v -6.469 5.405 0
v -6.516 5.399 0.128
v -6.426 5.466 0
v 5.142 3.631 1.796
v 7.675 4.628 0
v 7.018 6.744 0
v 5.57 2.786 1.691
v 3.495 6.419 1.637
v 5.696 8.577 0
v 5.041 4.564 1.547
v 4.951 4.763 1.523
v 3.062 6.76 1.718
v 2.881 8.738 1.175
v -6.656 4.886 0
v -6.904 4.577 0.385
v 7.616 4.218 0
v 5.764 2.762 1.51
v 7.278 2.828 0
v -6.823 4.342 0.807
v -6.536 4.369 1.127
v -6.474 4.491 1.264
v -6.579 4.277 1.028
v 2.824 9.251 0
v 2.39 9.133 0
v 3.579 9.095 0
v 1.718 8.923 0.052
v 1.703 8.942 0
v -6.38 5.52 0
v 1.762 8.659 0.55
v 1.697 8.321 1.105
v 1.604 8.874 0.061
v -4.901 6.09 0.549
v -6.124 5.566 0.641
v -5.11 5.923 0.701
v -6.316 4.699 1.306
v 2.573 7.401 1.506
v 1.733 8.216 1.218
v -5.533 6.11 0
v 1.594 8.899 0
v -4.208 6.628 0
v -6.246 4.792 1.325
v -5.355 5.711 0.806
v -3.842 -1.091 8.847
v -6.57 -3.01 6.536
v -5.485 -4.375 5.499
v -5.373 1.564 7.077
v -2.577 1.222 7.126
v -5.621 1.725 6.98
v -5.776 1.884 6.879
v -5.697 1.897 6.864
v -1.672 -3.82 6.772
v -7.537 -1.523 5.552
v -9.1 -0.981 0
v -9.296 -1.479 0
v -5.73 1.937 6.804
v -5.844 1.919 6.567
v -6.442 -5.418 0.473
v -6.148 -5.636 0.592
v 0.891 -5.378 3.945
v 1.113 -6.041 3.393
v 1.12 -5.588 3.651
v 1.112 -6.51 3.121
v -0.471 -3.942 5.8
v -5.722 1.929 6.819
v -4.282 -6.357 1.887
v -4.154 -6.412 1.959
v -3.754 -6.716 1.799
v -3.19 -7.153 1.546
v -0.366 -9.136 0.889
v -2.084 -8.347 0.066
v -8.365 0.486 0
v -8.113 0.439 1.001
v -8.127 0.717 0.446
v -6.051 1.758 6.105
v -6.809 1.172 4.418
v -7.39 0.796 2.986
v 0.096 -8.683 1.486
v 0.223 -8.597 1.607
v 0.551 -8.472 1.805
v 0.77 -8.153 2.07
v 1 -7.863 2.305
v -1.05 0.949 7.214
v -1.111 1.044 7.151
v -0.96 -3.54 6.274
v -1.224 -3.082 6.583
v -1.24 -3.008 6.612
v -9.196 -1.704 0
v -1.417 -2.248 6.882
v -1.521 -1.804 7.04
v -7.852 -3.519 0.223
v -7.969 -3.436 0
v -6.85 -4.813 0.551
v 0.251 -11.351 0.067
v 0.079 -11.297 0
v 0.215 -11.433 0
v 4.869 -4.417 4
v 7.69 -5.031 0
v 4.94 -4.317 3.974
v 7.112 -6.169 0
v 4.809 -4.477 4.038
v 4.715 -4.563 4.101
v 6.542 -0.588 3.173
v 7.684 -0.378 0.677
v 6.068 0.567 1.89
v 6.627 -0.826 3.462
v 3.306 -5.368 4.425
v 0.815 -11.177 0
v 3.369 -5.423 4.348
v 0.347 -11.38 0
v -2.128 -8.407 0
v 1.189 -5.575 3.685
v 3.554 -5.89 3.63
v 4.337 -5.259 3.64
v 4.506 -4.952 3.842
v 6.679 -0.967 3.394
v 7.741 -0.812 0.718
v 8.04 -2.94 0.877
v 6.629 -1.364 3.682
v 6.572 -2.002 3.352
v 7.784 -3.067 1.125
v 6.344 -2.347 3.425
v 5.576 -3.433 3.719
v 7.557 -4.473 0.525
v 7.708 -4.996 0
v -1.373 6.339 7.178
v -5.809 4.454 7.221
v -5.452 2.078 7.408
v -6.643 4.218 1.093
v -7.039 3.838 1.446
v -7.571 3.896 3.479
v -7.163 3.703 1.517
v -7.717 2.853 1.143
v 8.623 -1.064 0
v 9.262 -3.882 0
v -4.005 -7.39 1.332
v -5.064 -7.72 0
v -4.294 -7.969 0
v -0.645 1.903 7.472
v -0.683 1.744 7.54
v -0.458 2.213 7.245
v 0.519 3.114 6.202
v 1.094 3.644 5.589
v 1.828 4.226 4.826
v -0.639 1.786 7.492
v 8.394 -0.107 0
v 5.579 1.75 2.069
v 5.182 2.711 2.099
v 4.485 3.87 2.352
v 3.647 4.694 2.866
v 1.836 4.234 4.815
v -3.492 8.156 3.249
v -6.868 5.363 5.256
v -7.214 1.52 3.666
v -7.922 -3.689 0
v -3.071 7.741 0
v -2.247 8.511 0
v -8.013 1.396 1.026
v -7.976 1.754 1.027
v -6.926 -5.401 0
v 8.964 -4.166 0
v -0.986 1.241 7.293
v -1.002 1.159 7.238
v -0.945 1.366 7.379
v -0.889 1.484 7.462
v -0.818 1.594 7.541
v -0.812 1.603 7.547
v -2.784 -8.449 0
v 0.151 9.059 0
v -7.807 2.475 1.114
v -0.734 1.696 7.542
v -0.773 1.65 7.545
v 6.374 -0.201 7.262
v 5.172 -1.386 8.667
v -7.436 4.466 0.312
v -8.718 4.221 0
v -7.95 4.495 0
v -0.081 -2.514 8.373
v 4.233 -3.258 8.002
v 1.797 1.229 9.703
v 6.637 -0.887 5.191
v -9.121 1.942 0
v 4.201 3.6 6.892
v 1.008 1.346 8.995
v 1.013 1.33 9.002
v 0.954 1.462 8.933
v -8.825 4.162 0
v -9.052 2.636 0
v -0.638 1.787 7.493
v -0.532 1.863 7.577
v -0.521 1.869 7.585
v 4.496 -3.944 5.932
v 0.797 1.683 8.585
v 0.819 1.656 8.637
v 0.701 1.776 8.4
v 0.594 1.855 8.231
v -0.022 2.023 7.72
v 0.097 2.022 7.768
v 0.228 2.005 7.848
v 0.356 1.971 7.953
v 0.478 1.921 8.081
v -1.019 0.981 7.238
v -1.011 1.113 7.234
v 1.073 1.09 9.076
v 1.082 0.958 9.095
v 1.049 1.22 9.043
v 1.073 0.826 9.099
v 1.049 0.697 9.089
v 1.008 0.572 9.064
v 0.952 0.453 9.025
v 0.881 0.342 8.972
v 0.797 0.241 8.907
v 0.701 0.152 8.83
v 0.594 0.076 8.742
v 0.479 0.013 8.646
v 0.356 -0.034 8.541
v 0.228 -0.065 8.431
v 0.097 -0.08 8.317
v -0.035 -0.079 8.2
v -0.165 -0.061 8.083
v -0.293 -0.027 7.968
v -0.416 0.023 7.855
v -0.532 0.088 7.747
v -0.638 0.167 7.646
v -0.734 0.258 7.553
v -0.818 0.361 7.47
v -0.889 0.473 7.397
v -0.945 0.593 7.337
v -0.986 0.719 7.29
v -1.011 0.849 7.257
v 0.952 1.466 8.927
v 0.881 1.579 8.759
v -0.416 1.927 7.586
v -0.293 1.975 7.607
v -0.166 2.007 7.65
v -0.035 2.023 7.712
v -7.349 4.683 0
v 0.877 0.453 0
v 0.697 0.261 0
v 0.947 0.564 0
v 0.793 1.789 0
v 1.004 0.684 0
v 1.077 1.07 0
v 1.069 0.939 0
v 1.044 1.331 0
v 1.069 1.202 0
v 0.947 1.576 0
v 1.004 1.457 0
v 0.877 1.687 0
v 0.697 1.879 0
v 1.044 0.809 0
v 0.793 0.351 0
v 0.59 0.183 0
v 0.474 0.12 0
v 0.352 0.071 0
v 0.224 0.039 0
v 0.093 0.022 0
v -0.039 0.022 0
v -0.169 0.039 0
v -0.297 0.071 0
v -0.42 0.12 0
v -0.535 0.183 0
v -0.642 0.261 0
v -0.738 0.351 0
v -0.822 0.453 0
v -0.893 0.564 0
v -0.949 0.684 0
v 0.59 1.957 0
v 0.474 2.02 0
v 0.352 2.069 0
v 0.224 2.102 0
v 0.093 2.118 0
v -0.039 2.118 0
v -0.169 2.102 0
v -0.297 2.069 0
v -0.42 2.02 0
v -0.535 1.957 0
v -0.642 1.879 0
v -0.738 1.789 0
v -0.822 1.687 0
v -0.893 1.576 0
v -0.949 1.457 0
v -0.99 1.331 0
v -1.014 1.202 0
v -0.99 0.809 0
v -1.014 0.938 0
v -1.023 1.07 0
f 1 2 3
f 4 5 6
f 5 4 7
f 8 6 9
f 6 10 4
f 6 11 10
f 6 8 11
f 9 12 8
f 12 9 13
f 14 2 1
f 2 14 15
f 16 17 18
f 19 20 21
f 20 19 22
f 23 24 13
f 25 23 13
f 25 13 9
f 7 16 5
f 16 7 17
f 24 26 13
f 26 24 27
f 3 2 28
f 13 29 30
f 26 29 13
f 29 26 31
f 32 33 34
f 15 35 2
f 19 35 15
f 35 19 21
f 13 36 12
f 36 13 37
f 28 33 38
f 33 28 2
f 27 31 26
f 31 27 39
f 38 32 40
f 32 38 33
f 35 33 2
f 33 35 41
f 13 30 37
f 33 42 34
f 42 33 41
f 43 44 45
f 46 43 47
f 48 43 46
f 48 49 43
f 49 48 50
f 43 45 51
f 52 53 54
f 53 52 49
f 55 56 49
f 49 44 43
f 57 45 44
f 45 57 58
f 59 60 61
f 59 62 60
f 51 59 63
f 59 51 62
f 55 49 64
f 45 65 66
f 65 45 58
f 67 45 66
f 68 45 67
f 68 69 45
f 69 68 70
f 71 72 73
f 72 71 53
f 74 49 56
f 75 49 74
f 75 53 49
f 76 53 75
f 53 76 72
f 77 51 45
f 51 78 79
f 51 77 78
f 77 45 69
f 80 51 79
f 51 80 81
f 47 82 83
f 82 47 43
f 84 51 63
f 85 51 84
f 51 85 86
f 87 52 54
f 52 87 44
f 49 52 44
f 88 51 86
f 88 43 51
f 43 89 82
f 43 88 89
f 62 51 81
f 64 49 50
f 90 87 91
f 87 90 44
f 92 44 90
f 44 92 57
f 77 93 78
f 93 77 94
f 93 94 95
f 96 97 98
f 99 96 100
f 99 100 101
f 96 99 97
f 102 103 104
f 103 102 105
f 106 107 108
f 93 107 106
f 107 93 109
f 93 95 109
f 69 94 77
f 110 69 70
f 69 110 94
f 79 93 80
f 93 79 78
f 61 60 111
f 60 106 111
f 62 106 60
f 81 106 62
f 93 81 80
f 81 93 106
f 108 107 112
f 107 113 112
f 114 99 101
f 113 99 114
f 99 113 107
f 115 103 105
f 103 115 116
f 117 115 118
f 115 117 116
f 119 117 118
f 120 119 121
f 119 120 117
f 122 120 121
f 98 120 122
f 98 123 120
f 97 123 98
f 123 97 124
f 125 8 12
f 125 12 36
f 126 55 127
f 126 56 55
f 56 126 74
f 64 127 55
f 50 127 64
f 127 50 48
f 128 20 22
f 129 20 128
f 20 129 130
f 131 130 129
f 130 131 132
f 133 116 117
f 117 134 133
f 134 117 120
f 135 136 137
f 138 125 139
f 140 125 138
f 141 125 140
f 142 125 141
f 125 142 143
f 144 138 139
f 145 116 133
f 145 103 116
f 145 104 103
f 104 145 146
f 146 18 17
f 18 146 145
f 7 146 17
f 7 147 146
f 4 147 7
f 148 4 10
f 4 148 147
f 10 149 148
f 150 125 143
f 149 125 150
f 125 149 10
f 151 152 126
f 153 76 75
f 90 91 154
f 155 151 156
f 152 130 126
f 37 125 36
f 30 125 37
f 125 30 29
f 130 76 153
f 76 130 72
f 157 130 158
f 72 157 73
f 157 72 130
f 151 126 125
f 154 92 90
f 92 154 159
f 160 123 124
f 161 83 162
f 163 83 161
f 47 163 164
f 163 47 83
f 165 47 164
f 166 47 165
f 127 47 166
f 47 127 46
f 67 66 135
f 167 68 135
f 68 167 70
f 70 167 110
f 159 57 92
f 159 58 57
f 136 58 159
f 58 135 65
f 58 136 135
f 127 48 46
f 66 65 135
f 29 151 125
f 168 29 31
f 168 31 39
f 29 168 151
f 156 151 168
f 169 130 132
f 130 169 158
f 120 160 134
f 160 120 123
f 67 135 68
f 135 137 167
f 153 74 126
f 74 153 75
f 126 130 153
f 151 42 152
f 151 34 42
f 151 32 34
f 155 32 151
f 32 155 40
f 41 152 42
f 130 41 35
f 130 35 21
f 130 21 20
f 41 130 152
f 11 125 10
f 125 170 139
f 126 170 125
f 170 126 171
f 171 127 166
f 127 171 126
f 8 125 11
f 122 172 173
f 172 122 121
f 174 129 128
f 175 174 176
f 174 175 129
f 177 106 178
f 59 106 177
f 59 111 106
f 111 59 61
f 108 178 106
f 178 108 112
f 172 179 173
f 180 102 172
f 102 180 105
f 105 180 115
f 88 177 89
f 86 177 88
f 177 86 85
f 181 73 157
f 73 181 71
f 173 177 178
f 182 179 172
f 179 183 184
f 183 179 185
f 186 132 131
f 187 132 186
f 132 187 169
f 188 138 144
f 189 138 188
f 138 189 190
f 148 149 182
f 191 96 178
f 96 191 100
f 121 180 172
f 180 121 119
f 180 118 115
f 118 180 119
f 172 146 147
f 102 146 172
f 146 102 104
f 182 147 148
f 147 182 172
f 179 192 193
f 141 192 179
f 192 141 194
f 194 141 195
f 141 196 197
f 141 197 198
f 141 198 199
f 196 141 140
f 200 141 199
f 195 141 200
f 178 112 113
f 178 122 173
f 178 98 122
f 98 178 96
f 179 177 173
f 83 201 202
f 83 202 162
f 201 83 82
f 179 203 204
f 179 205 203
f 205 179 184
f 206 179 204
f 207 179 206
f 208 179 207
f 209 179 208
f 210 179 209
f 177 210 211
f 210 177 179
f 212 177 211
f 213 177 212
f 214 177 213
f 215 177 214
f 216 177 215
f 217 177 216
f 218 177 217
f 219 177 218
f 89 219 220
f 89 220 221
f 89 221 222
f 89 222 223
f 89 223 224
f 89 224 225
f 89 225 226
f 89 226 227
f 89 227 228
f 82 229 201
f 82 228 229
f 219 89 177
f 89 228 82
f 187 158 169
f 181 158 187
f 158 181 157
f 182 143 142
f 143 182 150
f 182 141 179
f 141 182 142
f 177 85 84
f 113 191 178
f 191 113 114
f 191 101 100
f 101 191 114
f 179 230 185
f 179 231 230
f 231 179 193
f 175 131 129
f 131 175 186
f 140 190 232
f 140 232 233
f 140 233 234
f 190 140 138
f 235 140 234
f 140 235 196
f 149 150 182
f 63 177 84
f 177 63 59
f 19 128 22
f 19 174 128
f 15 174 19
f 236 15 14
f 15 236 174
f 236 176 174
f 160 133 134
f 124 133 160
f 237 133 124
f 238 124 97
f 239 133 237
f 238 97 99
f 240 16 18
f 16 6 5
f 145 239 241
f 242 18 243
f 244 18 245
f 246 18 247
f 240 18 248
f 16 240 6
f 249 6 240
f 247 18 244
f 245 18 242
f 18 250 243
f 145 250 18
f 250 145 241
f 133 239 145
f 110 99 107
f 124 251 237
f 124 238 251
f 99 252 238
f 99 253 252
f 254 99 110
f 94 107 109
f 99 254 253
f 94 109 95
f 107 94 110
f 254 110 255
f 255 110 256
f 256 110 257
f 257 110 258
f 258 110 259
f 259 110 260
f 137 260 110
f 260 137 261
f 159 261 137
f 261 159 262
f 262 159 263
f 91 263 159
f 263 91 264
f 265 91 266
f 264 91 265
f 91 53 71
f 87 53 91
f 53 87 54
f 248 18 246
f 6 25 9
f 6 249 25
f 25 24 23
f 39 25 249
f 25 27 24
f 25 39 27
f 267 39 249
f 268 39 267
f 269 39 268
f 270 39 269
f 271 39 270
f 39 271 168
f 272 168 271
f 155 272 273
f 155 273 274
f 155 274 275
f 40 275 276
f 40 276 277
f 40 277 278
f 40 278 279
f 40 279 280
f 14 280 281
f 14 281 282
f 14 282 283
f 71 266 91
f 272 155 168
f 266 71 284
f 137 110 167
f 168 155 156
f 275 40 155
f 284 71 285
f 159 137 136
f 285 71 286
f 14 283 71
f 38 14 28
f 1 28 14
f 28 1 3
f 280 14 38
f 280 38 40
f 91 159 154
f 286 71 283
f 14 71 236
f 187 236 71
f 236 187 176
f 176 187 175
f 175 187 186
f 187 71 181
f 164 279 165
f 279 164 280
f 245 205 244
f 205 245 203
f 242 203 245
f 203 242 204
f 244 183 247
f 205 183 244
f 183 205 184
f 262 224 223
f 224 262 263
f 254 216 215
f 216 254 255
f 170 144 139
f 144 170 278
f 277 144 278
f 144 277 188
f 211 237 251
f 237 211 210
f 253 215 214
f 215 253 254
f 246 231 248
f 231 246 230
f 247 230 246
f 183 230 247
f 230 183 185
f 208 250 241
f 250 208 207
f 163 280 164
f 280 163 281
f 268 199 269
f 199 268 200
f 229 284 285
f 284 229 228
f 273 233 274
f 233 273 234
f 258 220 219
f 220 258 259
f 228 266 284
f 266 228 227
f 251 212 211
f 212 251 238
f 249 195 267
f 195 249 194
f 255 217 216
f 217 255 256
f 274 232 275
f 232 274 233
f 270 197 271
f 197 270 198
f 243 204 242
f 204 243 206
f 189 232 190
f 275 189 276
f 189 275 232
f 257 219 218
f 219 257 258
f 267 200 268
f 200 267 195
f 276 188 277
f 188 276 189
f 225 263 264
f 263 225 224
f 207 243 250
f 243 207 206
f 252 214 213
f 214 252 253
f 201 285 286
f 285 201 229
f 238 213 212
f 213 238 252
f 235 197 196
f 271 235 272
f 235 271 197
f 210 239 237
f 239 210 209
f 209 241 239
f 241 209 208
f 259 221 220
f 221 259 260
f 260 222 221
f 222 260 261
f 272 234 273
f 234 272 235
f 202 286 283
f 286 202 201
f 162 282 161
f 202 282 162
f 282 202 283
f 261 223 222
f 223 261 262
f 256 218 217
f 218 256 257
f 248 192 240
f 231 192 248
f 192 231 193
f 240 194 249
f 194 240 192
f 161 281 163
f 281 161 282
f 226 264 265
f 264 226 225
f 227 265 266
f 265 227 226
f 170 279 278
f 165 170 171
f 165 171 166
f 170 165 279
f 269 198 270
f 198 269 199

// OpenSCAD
// file: toothpick-fortification.scad
RANDOM_SEED_MOUND = 156;
RANDOM_SEED_SPIKES = 156;

LENGTH = 25;
WIDTH = 20;
HEIGHT = 12;
ANGLE = 45;

SPIKE_DIA = 2.1;
SPIKE_LENGTH = 30;
SPIKE_TOP_LENGTH = 7;
N_SPIKES = LENGTH/2;

X_BASE_ANGLE = 55;
Y_BASE_ANGLE = 0;

X_ANGLE_RAND = 10;
Y_ANGLE_RAND = 5;
X_RAND = 0;
Y_RAND = 6;
Z_RAND = 2;
LENGTH_RAND = 5;

MOUND_CHUNKYNESS = 6;
MOUND_CHUNK_MAX_SIZE = 15;
MOUND_CHUNKS = 300;
MOUND_CHUNKS_GROUP = 10;

$fn = 50;

module spike(dia, length, top_length) {
    union() {
        cylinder(d = dia, h = length - top_length);
        translate([0, 0, length - top_length])
        cylinder(d1 = dia, d2 = 0, h = top_length);
        translate([0, 0, -length])
        cylinder(d = dia, h = length);
    }
}

module spikes() {
    seeds = rands(0, 12375764435432, 6, RANDOM_SEED_SPIKES);
    x_delta = rands(-X_RAND, X_RAND, N_SPIKES, seeds[0]);
    y_delta = rands(-Y_RAND, Y_RAND, N_SPIKES, seeds[1]);
    z_delta = rands(0, Z_RAND, N_SPIKES, seeds[2]);
    x_angle_delta = rands(-X_ANGLE_RAND, X_ANGLE_RAND, N_SPIKES, seeds[3]);
    y_angle_delta = rands(-Y_ANGLE_RAND, Y_ANGLE_RAND, N_SPIKES, seeds[4]);
    len_delta = rands(-LENGTH_RAND, LENGTH_RAND, N_SPIKES, seeds[5]);

    for(i = [0:N_SPIKES-1]) {
        x = (i + 1) * LENGTH/(N_SPIKES+1) + x_delta[i] - LENGTH/2;
        rotate([0, 0, (x / LENGTH) * ANGLE])
        translate([x, y_delta[i], z_delta[i]])
        rotate([X_BASE_ANGLE + x_angle_delta[i], Y_BASE_ANGLE + y_angle_delta[i], 0])
        spike(SPIKE_DIA, SPIKE_LENGTH + len_delta[i], SPIKE_TOP_LENGTH);
    }
}

module base(width, length, height, angle) {
    if(angle == 0) {
        translate([-length/2, -width/2, 0])
        cube(size = [length, width, height]);
    } else {
        r = (length + width/2) * 360/(2 * angle * 3.1415);
        translate([0, r - width/2, 0])
        rotate([0, 0, 270 - angle/2])
        rotate_extrude(angle = angle, convexity = 10)
        square(size = [r, height]);
    }
}

module mound() {
    seeds = rands(0, 12375764435432, 4, RANDOM_SEED_MOUND);
    x = rands(-LENGTH/2, LENGTH/2, MOUND_CHUNKS, seeds[0]);
    y = rands(-WIDTH/2, WIDTH/2, MOUND_CHUNKS, seeds[1]);
    z = rands(0, HEIGHT, MOUND_CHUNKS, seeds[2]);
    size = rands(1, MOUND_CHUNK_MAX_SIZE, MOUND_CHUNKS, seeds[3]);
    intersection() {
        base(WIDTH, LENGTH, HEIGHT, ANGLE);
        union() {
            for(i = [0:MOUND_CHUNKS/MOUND_CHUNKS_GROUP-1]) {
                hull() {
                    for(j = [0:MOUND_CHUNKS_GROUP-1]) {
                        index = i * MOUND_CHUNKS_GROUP + j;
                        z_delta = z[index] * (WIDTH/2 - abs(y[index]))/(WIDTH/2) - size[index]/2;
                        rotate([0, 0, (x[index] / LENGTH) * ANGLE])
                        translate([x[index], y[index], z_delta])
                        rotate([540*x[index], 389*y[index], 734*z[index]])
                        sphere(d = size[index], $fn = MOUND_CHUNKYNESS);
                    }
                }
            }
        }
    }
}

difference() {
    mound();
    #spikes();
}
// main file
RANDOM_SEED_MOUND = 23;
RANDOM_SEED_SPIKES = RANDOM_SEED_MOUND;

SPIKE_DIA = 2.1;
SPIKE_LENGTH = 30;
SPIKE_TOP_LENGTH = 7;
N_SPIKES = 1;

X_BASE_ANGLE = 0;
Y_BASE_ANGLE = 0;

X_ANGLE_RAND = 5;
Y_ANGLE_RAND = 0;
X_RAND = 1;
Y_RAND = 2;
Z_RAND = 2;
LENGTH_RAND = 5;

HEIGHT = 12;
MOUND_DIA = 25;
MOUND_CHUNKYNESS = 6;
MOUND_CHUNK_MAX_SIZE = 15;
MOUND_CHUNKS = 50;
MOUND_CHUNKS_GROUP = 10;

use <toothpick-fortification.scad>;

$fn = 30;

module spikes() {
    seeds = rands(0, 12375764435432, 6, RANDOM_SEED_SPIKES);
    x_delta = rands(-X_RAND, X_RAND, N_SPIKES, seeds[0]);
    y_delta = rands(-Y_RAND, Y_RAND, N_SPIKES, seeds[1]);
    z_delta = rands(0, Z_RAND, N_SPIKES, seeds[2]);
    x_angle_delta = rands(-X_ANGLE_RAND, X_ANGLE_RAND, N_SPIKES, seeds[3]);
    y_angle_delta = rands(-Y_ANGLE_RAND, Y_ANGLE_RAND, N_SPIKES, seeds[4]);
    len_delta = rands(-LENGTH_RAND, LENGTH_RAND, N_SPIKES, seeds[5]);

    for(i = [0:N_SPIKES-1]) {
        d = MOUND_DIA * 0.75;
        x = (i + 1) * d/(N_SPIKES+1) + x_delta[i] - d/2;
        rotate([0, 0, (x / d)])
        translate([x, y_delta[i], z_delta[i]])
        rotate([X_BASE_ANGLE + x_angle_delta[i], Y_BASE_ANGLE + y_angle_delta[i] + x, 0])
        spike(SPIKE_DIA, SPIKE_LENGTH + len_delta[i], SPIKE_TOP_LENGTH);
    }
}

module mound() {
    seeds = rands(0, 12375764435432, 4, RANDOM_SEED_MOUND);
    r = rands(0, MOUND_DIA/2, MOUND_CHUNKS, seeds[0]);
    theta = rands(0, 360, MOUND_CHUNKS, seeds[1]);
    z = rands(0, HEIGHT, MOUND_CHUNKS, seeds[2]);
    size = rands(1, MOUND_CHUNK_MAX_SIZE, MOUND_CHUNKS, seeds[3]);
    intersection() {
        cylinder(d = 2 * MOUND_DIA, h = HEIGHT);
        union() {
            for(i = [0:MOUND_CHUNKS/MOUND_CHUNKS_GROUP-1]) {
                hull() {
                    for(j = [0:MOUND_CHUNKS_GROUP-1]) {
                        index = i * MOUND_CHUNKS_GROUP + j;
                        z_delta = z[index] * (MOUND_DIA/2 - abs(r[index]))/(MOUND_DIA/2) - size[index]/2;
                        r_delta = r[index] - size[index]/2;
                        rotate([0, 0, theta[index]])
                        translate([r_delta, 0, z_delta])
                        rotate([540*r[index], 389*theta[index], 734*z[index]])
                        sphere(d = size[index], $fn = MOUND_CHUNKYNESS);
                    }
                }
            }
        }
    }
}

difference() {
    mound();
    #spikes();
}
